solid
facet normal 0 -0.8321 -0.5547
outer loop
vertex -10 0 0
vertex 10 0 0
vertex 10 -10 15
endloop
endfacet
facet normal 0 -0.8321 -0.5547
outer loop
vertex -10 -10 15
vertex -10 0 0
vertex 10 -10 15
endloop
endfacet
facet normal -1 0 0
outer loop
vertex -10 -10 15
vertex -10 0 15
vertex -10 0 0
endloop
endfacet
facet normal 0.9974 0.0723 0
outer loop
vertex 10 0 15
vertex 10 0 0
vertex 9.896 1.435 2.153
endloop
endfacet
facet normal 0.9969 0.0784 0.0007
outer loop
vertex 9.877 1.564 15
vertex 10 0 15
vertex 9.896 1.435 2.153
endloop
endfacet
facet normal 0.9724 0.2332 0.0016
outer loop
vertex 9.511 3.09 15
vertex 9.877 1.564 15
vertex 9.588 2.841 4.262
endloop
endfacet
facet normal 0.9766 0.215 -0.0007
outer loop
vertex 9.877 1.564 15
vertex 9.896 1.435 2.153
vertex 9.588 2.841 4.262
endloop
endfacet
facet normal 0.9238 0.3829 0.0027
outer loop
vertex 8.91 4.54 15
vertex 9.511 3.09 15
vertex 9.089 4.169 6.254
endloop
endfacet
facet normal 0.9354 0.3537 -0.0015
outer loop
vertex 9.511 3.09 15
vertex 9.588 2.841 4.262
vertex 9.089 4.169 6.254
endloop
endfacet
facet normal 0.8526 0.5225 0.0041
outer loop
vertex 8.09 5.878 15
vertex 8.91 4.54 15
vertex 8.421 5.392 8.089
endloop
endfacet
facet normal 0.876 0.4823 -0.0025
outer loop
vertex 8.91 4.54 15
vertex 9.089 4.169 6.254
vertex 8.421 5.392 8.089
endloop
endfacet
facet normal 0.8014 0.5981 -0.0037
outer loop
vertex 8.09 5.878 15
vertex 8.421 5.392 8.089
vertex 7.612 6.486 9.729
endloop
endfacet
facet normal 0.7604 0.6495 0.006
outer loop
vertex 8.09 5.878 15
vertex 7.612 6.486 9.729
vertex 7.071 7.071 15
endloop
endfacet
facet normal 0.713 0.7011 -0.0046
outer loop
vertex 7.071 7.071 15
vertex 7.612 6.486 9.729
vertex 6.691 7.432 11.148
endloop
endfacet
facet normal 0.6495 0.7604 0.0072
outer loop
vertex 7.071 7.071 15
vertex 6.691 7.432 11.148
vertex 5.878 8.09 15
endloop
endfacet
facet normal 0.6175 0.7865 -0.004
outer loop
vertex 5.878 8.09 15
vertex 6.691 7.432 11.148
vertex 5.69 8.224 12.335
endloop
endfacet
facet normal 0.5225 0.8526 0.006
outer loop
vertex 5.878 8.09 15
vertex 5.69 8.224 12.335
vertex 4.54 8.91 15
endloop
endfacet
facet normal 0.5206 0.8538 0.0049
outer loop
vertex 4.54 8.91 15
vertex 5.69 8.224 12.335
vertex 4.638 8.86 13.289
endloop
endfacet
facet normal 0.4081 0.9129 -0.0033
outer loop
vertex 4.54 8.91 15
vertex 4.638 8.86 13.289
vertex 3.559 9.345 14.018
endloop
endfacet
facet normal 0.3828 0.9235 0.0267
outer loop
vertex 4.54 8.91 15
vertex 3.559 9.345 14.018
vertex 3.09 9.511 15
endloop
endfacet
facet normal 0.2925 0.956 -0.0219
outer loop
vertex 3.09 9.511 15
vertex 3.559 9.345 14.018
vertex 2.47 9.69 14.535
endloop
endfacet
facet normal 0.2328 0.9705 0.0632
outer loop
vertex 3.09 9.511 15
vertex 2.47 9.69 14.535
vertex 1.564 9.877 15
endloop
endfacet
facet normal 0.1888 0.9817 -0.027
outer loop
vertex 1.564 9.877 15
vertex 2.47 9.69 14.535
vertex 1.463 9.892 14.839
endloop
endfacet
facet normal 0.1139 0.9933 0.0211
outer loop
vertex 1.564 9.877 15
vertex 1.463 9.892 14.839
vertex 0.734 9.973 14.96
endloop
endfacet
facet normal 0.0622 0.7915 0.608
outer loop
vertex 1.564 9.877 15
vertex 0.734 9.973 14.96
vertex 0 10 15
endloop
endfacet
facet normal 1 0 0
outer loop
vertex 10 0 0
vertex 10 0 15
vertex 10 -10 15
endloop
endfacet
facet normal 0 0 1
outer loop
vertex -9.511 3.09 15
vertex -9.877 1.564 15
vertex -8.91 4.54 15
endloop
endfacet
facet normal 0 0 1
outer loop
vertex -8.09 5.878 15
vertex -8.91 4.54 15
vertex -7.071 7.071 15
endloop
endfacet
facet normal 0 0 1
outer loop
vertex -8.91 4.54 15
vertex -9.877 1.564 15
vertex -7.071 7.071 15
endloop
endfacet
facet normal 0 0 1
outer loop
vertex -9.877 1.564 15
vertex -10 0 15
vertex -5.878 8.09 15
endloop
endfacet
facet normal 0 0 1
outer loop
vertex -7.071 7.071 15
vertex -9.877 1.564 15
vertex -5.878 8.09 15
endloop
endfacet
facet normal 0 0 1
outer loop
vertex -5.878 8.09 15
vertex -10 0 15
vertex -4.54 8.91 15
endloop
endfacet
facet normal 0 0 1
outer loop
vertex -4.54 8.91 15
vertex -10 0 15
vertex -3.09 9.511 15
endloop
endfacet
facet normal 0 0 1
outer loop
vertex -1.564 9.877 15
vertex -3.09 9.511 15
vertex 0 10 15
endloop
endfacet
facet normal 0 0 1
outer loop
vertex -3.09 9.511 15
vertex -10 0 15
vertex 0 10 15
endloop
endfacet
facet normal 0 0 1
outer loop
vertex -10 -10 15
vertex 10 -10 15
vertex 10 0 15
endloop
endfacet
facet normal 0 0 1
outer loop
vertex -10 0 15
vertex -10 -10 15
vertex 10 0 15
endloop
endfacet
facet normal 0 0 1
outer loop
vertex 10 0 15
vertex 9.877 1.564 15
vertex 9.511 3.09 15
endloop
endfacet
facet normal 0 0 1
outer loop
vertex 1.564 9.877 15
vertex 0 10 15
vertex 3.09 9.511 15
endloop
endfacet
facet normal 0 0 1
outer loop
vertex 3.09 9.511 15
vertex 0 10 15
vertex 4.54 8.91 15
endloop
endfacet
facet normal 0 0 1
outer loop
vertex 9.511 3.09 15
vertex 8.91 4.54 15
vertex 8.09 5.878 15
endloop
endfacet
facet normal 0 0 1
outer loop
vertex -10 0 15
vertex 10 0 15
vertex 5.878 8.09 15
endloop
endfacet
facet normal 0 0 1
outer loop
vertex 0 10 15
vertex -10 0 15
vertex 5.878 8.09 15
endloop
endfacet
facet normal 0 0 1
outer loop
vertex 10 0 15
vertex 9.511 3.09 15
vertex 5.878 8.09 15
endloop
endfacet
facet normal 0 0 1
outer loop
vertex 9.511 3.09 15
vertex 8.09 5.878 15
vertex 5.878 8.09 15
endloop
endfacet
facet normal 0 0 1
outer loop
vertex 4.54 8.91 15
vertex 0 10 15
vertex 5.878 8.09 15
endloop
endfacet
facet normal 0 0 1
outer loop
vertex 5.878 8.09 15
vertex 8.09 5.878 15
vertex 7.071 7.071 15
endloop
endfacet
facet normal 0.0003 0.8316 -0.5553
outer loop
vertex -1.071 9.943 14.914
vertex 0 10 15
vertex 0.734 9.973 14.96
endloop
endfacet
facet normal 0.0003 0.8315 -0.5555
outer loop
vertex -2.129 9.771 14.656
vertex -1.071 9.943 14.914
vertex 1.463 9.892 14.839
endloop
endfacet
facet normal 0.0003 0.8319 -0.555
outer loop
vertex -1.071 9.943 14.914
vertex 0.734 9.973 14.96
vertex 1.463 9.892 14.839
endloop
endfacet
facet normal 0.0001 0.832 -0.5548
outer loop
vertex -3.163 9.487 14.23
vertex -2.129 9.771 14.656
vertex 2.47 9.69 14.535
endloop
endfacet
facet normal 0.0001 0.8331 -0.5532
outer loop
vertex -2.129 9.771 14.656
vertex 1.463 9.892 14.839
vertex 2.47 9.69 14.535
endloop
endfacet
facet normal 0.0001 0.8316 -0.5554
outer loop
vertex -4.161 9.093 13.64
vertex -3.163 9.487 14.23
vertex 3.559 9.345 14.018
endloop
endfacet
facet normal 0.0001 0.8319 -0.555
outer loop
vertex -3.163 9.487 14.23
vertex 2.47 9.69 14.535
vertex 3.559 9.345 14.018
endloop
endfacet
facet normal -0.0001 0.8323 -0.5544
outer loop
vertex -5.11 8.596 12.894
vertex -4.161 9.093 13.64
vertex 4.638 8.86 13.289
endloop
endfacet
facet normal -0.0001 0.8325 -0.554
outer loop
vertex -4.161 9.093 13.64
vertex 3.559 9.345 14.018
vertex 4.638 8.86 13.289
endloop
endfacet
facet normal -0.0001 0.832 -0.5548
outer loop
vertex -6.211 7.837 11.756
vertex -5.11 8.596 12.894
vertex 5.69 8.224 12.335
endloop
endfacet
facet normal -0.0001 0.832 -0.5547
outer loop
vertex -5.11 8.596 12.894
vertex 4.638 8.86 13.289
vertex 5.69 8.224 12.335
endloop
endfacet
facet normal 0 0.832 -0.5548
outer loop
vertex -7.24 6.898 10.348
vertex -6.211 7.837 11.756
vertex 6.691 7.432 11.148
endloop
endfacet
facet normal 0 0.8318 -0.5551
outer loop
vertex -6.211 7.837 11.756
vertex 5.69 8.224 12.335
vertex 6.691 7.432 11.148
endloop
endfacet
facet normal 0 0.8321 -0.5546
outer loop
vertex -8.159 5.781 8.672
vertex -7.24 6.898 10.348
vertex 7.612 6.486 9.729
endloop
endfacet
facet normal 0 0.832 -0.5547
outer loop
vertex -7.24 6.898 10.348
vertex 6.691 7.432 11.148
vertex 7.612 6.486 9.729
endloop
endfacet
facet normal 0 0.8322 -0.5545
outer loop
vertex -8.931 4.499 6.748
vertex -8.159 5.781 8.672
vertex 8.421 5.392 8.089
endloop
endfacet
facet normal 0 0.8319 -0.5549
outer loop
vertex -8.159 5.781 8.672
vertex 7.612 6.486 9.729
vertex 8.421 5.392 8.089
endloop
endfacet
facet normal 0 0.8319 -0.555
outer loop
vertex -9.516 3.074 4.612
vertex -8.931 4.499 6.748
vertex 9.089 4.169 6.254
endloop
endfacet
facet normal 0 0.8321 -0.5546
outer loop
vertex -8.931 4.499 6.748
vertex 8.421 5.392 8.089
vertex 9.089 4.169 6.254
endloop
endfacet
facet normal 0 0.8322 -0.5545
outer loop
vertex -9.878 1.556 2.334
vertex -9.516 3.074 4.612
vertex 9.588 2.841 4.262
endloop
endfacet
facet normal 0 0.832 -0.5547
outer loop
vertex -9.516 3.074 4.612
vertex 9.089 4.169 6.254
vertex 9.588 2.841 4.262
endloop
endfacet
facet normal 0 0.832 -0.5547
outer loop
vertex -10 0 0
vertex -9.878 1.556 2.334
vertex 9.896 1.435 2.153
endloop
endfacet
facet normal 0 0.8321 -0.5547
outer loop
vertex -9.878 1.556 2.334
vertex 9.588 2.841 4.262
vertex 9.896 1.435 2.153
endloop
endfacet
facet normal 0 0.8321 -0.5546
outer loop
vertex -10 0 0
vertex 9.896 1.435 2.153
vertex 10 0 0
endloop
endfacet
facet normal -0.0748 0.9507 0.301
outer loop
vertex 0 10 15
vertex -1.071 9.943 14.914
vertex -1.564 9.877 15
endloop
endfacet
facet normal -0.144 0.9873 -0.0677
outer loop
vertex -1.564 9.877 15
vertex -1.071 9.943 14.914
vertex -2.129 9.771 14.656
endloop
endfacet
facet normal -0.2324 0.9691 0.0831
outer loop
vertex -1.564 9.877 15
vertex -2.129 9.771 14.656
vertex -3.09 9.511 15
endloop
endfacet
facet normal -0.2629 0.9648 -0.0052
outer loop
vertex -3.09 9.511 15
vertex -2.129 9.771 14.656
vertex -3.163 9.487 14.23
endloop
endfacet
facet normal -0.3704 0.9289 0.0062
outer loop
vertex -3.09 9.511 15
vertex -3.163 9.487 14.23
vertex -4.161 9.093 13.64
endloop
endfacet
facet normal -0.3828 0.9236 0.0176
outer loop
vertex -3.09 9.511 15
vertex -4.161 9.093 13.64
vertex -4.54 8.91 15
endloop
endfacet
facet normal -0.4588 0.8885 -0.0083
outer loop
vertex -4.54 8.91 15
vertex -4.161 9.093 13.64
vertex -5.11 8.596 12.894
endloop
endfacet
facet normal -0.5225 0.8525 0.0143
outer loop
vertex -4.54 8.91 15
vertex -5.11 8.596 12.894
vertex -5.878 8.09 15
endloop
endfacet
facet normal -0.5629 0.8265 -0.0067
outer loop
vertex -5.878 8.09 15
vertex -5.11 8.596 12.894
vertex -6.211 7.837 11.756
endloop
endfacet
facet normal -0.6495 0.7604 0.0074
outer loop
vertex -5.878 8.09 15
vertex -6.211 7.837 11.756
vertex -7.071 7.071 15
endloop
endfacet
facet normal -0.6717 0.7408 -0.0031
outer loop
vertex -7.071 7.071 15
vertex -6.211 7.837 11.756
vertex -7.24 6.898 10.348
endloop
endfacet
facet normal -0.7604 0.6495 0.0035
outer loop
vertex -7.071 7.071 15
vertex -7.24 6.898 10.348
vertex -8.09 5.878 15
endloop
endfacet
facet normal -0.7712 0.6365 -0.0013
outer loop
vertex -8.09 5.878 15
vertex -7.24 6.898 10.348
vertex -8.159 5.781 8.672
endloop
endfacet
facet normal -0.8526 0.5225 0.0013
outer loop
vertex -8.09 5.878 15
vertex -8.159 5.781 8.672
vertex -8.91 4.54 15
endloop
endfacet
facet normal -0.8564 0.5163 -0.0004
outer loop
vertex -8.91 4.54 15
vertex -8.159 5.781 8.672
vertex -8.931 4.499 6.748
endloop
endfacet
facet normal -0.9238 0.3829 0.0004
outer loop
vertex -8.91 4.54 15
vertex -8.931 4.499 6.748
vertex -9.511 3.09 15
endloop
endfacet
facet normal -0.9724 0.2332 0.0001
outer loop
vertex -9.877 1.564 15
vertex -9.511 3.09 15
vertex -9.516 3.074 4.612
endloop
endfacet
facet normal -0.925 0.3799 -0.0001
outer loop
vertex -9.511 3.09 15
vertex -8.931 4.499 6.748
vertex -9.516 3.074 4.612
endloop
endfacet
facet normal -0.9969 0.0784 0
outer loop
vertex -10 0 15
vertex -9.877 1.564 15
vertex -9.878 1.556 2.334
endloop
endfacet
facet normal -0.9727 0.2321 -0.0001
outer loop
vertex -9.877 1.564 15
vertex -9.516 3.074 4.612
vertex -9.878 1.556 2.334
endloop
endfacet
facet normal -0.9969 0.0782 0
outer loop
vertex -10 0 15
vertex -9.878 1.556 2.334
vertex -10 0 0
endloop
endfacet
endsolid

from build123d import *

# Parameters (mm, degrees)
SKETCH1_R           = 10
BOSS_EXTRUDE1_DEPTH = 15
CUT_EXTRUDE1_DEPTH  = 16
CUT_EXTRUDE2_DEPTH  = 10
CUT_EXTRUDE3_DEPTH  = 10
SKETCH7_W           = 15
SKETCH7_H           = 10
BOSS_EXTRUDE2_DEPTH = 10
CUT_EXTRUDE4_DEPTH  = 20


with BuildPart() as part:
    # Sketch1 → Boss-Extrude1 (new body)
    with BuildSketch(Plane.XY):
        Circle(SKETCH1_R)
    extrude(amount=BOSS_EXTRUDE1_DEPTH)

    # Sketch2 → Cut-Extrude1 (cut, through all)
    with BuildSketch(Plane.XY.offset(15)):
        with BuildLine():
            Line((0, 0), (10, 0))
            ThreePointArc((10, 0), (7.071067812, -7.071067812), (0, -10))
            Line((0, -10), (0, 0))
        make_face()
    extrude(amount=-CUT_EXTRUDE1_DEPTH, mode=Mode.SUBTRACT)

    # Sketch5 → Cut-Extrude2 (cut)
    with BuildSketch(Plane(origin=(10, 0, 0), x_dir=(0, 0, -1), z_dir=(1, 0, 0))):
        Polygon((0, 0), (0, 10), (-15, 10), align=None)
    extrude(amount=-CUT_EXTRUDE2_DEPTH, mode=Mode.SUBTRACT)

    # Sketch6 → Cut-Extrude3 (cut)
    with BuildSketch(Plane(origin=(0, 0, 0), x_dir=(0, 0, -1), z_dir=(1, 0, 0))):
        Polygon((-15, 10), (0, 0), (0, 10), align=None)
    extrude(amount=-CUT_EXTRUDE3_DEPTH, mode=Mode.SUBTRACT)

    # Sketch7 → Boss-Extrude2 (add, symmetric)
    with BuildSketch(Plane(origin=(0, 0, 0), x_dir=(0, 0, -1), z_dir=(1, 0, 0))):
        with Locations((-7.5, -5)):
            Rectangle(SKETCH7_W, SKETCH7_H)
    extrude(amount=BOSS_EXTRUDE2_DEPTH, both=True)

    # Sketch8 → Cut-Extrude4 (cut)
    with BuildSketch(Plane(origin=(10, 0, 0), x_dir=(0, 0, -1), z_dir=(1, 0, 0))):
        Polygon((0, 0), (-15, -10), (0, -10), align=None)
    extrude(amount=-CUT_EXTRUDE4_DEPTH, mode=Mode.SUBTRACT)


solid = part.part
